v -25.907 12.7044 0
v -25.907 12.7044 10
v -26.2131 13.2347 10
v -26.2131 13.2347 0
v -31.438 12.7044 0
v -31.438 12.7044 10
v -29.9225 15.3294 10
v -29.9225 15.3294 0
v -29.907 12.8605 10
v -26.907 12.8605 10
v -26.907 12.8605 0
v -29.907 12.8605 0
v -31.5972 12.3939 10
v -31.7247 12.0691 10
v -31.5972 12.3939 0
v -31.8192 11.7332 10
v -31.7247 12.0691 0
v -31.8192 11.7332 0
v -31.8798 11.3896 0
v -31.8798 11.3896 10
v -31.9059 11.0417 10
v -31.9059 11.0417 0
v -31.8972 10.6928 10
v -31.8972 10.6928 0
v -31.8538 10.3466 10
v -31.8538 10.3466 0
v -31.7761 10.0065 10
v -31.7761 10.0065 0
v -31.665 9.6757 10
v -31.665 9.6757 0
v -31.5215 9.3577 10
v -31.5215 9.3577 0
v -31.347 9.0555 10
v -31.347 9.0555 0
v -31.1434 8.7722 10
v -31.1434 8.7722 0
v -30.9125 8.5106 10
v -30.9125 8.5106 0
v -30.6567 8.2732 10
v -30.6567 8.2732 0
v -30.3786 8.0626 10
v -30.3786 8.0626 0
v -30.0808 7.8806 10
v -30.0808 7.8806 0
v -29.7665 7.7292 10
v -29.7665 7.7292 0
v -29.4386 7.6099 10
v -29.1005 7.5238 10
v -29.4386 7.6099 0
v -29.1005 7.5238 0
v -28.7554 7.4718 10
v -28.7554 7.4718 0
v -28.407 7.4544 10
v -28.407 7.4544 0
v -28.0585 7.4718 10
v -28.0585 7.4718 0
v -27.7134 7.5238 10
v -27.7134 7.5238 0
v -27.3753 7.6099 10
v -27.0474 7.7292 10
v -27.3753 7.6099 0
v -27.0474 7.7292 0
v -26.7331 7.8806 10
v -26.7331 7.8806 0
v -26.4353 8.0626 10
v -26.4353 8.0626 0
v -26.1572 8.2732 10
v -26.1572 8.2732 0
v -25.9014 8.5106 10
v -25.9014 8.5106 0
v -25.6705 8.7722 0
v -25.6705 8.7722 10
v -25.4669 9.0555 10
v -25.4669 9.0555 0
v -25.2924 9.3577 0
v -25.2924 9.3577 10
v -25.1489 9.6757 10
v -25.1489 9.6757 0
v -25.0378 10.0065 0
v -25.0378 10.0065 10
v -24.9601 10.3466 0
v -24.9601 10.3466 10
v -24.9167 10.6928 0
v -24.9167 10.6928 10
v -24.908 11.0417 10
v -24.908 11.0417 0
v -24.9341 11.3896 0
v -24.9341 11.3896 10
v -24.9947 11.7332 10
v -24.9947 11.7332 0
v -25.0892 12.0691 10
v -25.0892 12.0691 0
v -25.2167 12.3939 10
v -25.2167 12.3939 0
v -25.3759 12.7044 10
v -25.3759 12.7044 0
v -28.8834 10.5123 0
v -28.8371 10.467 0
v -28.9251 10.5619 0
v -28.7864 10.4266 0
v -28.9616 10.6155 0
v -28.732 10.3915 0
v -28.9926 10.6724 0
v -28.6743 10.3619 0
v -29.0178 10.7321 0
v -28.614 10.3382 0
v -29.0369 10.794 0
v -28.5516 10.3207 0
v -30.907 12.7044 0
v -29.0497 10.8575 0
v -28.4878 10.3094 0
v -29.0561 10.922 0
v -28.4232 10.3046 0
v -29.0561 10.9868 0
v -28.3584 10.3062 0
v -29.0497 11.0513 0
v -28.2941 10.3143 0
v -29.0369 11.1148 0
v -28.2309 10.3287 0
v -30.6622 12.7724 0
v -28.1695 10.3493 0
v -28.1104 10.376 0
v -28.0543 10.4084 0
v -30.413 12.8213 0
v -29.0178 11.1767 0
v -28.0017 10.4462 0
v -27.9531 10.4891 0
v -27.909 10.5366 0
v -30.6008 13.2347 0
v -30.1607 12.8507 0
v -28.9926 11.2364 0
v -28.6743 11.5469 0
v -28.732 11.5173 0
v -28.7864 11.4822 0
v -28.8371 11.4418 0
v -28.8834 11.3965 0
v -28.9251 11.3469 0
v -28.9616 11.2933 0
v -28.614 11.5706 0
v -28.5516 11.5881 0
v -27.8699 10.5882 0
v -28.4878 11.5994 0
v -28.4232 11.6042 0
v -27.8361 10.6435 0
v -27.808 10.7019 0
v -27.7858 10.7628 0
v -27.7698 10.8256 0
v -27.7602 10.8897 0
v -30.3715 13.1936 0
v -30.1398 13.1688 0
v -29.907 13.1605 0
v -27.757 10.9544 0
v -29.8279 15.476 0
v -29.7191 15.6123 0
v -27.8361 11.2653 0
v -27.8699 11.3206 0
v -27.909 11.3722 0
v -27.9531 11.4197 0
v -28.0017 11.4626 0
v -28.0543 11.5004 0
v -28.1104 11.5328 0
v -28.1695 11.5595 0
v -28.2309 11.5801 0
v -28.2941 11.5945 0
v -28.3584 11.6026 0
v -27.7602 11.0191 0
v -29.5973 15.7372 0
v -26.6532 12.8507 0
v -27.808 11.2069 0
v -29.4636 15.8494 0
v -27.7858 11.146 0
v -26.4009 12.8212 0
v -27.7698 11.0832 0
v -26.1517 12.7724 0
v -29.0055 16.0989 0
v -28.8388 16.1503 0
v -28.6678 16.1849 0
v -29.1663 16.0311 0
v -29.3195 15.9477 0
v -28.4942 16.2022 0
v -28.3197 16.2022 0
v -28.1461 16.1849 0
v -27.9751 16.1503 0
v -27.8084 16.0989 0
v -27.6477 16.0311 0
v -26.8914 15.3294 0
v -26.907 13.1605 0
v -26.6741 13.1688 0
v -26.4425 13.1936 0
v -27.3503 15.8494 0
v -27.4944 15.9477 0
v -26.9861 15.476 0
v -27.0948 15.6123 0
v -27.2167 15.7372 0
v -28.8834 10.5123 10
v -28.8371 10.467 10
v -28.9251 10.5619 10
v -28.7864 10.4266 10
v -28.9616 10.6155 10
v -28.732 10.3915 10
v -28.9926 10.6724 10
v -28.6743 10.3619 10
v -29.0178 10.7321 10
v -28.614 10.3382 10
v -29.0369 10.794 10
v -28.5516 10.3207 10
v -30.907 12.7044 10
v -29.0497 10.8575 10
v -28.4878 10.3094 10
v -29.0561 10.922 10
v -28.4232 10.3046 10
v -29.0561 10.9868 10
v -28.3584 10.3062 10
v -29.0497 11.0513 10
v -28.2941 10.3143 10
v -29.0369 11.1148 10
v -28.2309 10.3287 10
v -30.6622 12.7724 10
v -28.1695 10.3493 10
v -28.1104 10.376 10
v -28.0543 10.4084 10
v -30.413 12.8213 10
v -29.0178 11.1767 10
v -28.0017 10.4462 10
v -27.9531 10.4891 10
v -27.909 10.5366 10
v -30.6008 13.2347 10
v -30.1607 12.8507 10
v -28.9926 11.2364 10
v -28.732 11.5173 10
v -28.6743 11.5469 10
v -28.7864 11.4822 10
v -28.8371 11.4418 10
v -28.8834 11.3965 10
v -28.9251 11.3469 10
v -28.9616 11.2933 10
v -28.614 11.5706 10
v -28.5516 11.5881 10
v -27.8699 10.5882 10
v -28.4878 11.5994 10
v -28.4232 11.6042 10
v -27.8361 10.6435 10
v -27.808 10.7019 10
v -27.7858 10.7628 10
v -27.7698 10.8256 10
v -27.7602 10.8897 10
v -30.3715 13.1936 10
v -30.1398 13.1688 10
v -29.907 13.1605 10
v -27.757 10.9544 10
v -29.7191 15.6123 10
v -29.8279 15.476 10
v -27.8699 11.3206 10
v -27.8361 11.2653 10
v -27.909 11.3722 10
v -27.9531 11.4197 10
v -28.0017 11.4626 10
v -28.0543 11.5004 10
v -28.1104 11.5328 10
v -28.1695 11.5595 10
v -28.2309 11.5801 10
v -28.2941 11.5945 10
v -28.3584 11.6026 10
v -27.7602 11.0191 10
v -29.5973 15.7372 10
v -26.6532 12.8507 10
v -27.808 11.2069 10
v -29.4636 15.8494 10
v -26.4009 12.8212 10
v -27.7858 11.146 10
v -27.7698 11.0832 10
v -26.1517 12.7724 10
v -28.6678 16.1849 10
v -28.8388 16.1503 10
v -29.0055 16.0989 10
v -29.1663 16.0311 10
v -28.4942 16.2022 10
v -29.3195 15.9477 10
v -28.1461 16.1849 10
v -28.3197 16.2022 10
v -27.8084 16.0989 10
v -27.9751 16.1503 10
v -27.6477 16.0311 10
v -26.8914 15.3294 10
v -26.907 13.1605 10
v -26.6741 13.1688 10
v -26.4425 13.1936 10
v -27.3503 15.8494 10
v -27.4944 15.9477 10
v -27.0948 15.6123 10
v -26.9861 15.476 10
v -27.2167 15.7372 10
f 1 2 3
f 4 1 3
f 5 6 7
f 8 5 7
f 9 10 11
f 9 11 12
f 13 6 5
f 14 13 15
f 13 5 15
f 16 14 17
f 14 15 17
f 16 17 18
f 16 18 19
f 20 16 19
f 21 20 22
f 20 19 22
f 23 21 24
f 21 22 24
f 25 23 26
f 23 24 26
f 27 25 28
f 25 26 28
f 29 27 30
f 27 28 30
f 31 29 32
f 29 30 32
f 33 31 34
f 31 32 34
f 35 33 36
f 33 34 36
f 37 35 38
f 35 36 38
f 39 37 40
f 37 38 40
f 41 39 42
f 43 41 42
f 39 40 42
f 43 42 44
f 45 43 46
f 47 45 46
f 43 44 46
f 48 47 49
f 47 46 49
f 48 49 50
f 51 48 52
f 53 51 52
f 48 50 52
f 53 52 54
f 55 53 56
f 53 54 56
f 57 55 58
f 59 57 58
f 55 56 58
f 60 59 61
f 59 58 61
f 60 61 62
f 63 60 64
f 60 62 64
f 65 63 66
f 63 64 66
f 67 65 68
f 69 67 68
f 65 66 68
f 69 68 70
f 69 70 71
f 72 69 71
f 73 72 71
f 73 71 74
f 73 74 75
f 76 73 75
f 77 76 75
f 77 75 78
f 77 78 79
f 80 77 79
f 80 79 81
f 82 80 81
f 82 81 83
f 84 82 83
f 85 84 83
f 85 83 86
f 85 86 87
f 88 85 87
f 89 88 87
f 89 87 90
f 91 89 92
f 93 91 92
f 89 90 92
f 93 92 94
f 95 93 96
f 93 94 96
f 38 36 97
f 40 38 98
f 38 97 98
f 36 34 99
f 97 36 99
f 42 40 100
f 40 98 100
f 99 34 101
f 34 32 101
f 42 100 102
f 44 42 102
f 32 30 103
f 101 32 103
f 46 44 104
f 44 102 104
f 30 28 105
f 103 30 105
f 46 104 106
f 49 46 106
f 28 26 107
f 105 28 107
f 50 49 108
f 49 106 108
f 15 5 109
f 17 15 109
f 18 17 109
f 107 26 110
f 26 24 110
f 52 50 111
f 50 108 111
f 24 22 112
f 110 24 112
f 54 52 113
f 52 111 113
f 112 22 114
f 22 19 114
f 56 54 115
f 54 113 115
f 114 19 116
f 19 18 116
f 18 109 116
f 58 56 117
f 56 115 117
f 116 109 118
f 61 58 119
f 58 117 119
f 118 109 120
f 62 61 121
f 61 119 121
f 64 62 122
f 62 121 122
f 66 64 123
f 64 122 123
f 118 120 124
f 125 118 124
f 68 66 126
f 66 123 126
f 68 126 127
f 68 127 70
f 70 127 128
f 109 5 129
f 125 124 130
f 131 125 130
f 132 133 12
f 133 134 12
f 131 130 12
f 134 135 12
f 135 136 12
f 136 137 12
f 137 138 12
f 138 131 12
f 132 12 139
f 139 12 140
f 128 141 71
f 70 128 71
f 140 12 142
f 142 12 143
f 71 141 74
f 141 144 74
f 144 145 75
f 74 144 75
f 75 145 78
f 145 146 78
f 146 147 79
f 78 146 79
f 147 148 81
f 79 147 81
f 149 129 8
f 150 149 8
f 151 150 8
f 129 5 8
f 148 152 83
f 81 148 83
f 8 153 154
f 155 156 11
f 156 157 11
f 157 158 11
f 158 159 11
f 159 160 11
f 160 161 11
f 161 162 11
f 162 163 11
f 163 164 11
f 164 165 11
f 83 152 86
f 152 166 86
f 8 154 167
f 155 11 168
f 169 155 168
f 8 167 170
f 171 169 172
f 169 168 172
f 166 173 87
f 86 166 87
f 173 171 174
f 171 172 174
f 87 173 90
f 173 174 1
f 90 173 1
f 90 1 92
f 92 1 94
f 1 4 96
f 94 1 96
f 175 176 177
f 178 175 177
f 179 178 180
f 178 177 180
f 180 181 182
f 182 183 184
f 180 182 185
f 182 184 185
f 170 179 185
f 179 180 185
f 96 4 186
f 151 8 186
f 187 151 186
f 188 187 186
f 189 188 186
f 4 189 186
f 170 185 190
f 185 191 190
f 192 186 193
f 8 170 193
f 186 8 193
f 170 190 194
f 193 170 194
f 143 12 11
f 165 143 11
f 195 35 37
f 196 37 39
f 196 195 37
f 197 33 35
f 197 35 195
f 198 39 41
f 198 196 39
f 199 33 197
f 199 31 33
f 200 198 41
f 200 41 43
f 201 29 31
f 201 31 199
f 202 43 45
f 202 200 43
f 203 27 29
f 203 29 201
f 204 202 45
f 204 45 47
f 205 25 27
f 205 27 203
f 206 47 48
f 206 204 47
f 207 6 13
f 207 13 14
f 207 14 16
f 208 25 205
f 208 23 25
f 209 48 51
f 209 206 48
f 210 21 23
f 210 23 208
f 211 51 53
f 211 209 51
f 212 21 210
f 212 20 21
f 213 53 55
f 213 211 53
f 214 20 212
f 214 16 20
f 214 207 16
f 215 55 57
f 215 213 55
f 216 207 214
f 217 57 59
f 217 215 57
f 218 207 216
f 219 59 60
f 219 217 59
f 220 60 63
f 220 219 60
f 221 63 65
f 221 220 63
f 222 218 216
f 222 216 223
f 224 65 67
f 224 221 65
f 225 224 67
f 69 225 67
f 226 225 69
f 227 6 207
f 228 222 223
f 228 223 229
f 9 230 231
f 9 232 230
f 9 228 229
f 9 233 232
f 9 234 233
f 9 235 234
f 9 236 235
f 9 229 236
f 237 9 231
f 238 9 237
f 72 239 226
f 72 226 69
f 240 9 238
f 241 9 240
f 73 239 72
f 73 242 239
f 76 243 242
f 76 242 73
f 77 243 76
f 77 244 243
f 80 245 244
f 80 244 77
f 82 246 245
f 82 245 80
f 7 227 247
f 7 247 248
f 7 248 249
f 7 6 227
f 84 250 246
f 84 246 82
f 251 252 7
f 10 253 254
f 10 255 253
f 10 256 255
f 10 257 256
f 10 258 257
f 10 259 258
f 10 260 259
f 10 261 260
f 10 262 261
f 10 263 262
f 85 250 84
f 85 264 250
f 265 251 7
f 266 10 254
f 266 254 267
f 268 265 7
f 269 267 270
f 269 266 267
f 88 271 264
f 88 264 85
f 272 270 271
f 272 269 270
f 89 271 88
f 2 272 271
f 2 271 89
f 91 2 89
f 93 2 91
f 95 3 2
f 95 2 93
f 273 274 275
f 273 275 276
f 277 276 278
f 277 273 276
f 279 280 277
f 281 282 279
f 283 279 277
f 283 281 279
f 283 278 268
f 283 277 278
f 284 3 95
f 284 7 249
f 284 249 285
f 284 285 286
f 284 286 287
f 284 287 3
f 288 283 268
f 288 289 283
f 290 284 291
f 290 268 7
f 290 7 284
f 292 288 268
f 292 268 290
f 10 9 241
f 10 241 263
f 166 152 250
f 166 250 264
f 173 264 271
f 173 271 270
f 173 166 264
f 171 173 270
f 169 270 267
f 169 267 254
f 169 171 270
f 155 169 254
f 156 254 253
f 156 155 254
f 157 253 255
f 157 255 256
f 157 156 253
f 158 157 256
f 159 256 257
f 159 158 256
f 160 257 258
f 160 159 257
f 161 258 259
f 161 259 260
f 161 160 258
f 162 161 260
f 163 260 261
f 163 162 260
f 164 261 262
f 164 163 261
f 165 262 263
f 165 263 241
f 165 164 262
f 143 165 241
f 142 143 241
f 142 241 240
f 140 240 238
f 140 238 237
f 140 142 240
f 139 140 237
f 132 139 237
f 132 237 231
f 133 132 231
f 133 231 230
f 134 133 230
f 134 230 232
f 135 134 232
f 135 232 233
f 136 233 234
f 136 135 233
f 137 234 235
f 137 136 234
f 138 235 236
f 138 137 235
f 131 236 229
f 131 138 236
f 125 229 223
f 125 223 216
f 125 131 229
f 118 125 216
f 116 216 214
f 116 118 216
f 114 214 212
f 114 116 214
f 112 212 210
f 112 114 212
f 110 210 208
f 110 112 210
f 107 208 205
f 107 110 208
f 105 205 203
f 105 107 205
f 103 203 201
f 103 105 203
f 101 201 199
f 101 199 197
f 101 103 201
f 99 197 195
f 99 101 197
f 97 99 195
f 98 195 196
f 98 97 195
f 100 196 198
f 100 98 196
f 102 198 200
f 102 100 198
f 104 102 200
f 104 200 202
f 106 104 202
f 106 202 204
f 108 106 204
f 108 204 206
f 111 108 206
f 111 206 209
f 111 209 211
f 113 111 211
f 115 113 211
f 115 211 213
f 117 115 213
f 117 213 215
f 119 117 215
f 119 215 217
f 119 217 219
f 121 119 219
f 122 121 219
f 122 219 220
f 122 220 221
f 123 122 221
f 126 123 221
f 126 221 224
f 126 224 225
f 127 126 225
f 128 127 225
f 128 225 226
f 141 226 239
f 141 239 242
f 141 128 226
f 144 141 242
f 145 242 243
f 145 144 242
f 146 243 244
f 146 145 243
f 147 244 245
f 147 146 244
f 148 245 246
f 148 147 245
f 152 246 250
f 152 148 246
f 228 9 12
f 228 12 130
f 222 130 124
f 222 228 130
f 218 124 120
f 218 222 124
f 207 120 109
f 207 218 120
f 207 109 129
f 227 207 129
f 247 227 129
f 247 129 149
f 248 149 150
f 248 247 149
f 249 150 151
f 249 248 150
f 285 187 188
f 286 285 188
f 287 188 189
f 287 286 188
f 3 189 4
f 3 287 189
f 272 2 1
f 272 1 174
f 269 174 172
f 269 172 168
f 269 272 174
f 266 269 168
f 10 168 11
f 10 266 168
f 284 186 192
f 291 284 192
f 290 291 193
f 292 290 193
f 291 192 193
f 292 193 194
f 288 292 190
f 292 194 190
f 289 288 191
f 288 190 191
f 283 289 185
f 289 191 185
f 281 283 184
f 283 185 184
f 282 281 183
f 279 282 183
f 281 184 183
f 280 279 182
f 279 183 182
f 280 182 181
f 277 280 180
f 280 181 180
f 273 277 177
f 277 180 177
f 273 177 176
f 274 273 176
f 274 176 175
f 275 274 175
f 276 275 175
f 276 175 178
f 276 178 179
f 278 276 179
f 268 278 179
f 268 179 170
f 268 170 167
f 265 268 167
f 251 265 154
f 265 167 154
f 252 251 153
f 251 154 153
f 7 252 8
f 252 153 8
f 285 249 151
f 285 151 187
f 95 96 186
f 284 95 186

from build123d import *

# Parameters (mm, degrees)
SKETCH_R     = 0.65
PAD_DEPTH    = 10
POCKET_DEPTH = 10.001


with BuildPart() as part:
    # Sketch → Pad (new body)
    with BuildSketch(Plane.XY):
        with BuildLine():
            ThreePointArc((-31.438047, 12.704399), (-28.406958, 7.454399), (-25.375869, 12.704399))
            Line((-25.375869, 12.704399), (-26.891414, 15.329399))
            ThreePointArc((-26.891414, 15.329399), (-28.406958, 16.204399), (-29.922503, 15.329399))
            Line((-31.438047, 12.704399), (-29.922503, 15.329399))
        make_face()
        with Locations((-28.406958, 10.954399)):
            Circle(SKETCH_R, mode=Mode.SUBTRACT)
    extrude(amount=PAD_DEPTH)

    # Sketch001 (on Face7 of Pad) → Pocket (cut, through all)
    with BuildSketch(Plane.XY.offset(10)):
        with BuildLine():
            ThreePointArc((-30.600779, 13.234717), (-30.255847, 13.179118), (-29.906958, 13.160514))
            Line((-29.906958, 13.160514), (-26.906958, 13.160514))
            ThreePointArc((-26.906958, 13.160514), (-26.55807, 13.179118), (-26.213138, 13.234717))
            Line((-25.906958, 12.704399), (-26.213138, 13.234717))
            ThreePointArc((-25.906958, 12.704399), (-26.400902, 12.82125), (-26.906958, 12.860514))
            Line((-26.906958, 12.860514), (-29.906958, 12.860514))
            ThreePointArc((-29.906958, 12.860514), (-30.413015, 12.82125), (-30.906958, 12.704399))
            Line((-30.906958, 12.704399), (-30.600779, 13.234717))
        make_face()
    extrude(amount=-POCKET_DEPTH, mode=Mode.SUBTRACT)


solid = part.part
